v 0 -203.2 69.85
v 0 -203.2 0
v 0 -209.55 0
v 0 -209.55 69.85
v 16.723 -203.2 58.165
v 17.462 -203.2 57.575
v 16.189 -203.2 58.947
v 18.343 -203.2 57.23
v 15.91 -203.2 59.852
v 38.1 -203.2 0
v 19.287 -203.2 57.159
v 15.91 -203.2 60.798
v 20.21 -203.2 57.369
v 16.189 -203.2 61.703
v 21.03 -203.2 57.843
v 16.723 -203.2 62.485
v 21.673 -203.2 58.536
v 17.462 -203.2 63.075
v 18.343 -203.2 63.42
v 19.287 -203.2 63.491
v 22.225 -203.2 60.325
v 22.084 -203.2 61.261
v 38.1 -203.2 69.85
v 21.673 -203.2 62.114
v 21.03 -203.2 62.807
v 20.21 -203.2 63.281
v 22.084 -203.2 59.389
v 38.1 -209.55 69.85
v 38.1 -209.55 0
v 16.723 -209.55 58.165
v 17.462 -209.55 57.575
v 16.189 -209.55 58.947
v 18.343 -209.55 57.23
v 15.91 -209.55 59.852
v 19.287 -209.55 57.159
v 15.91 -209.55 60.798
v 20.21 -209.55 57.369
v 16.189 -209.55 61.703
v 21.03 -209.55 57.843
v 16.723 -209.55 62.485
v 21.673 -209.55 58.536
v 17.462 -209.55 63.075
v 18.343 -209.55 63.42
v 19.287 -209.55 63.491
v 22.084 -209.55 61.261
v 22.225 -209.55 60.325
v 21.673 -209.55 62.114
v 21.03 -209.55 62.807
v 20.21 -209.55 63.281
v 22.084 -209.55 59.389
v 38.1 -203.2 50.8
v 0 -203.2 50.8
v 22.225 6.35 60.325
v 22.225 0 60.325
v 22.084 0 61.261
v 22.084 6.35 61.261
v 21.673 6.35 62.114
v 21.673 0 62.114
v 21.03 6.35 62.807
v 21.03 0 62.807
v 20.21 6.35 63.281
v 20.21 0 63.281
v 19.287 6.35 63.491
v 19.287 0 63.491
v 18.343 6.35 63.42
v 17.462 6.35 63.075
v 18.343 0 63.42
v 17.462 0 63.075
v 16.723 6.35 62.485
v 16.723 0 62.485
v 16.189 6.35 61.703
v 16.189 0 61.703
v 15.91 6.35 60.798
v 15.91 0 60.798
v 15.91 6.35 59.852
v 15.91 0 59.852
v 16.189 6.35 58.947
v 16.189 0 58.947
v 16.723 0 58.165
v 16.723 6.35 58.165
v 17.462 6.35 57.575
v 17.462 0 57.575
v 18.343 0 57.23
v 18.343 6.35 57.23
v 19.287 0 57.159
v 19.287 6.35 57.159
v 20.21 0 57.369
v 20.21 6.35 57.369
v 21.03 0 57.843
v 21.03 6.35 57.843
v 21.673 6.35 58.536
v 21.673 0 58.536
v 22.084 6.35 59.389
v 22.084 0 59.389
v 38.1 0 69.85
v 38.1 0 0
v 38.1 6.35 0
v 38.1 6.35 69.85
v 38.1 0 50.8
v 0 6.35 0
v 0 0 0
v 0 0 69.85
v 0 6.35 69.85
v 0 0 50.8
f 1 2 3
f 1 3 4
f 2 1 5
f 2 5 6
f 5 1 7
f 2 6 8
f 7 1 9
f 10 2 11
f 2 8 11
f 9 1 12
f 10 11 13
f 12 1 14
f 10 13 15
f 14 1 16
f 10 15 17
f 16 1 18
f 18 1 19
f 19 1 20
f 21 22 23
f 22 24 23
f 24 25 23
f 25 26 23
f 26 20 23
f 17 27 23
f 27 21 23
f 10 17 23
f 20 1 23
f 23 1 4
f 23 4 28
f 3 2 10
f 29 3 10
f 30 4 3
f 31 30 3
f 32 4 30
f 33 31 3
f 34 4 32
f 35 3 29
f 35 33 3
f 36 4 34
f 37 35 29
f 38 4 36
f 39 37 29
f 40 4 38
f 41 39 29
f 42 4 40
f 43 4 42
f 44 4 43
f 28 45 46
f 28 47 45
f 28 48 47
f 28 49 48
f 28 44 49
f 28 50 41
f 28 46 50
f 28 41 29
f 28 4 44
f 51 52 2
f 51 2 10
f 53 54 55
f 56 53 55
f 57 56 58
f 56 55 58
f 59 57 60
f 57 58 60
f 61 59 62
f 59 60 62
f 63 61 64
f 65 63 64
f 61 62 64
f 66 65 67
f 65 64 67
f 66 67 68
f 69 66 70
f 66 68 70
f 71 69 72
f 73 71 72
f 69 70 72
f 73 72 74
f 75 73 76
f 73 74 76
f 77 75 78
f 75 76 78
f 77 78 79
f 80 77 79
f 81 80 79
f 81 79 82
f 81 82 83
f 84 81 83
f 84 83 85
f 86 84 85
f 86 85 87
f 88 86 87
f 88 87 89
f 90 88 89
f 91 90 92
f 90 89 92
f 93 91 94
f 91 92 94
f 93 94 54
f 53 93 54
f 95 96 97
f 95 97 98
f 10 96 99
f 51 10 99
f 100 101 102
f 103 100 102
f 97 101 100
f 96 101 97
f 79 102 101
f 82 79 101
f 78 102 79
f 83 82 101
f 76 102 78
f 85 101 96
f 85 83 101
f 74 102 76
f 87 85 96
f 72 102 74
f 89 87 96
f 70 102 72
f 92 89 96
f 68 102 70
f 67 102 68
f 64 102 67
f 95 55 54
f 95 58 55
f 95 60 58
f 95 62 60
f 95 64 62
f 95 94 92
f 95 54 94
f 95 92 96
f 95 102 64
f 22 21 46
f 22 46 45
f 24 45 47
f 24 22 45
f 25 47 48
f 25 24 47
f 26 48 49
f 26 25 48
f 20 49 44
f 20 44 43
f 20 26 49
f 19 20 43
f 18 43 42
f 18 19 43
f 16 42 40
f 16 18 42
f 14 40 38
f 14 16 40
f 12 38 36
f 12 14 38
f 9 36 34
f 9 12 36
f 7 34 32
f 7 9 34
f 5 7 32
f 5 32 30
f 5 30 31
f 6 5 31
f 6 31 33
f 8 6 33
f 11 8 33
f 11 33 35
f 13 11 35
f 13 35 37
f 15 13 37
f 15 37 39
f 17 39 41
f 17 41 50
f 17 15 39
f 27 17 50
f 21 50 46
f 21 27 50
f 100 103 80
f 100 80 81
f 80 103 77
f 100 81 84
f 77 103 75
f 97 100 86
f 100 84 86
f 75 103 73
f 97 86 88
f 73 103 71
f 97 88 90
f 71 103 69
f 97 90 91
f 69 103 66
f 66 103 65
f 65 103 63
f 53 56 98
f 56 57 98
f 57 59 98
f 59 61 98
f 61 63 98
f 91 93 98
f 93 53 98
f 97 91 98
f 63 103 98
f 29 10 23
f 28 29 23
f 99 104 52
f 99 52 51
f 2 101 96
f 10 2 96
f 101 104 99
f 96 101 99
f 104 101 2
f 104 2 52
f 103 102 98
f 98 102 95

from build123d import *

# Parameters (mm, degrees)
F0_W     = 38.1
F0_H     = 50.8
F1_DEPTH = 203.2
F6_W     = 38.1
F6_H     = 69.85
F6_R     = 3.175
F7_DEPTH = 6.35


with BuildPart() as f1:
    # F0 (on Front) → F1 (new body)
    with BuildSketch(Plane.XZ):
        with Locations((19.05, 25.4)):
            Rectangle(F0_W, F0_H)
    extrude(amount=F1_DEPTH)


with BuildPart() as f7:
    # F6 (on face) → F7 (new body)
    with BuildSketch(Plane.XZ.offset(203.2)):
        with Locations((19.05, 34.925)):
            Rectangle(F6_W, F6_H)
        with Locations((19.05, 60.325)):
            Circle(F6_R, mode=Mode.SUBTRACT)
    extrude(amount=F7_DEPTH)


with BuildPart() as f8_1:
    # F8: instance of F7
    add(f7.part.mirror(Plane(origin=(0, -101.6, 50.8), x_dir=(1, 0, 0), z_dir=(0, -1, 0))))


solid = Compound([f1.part, f7.part, f8_1.part])
